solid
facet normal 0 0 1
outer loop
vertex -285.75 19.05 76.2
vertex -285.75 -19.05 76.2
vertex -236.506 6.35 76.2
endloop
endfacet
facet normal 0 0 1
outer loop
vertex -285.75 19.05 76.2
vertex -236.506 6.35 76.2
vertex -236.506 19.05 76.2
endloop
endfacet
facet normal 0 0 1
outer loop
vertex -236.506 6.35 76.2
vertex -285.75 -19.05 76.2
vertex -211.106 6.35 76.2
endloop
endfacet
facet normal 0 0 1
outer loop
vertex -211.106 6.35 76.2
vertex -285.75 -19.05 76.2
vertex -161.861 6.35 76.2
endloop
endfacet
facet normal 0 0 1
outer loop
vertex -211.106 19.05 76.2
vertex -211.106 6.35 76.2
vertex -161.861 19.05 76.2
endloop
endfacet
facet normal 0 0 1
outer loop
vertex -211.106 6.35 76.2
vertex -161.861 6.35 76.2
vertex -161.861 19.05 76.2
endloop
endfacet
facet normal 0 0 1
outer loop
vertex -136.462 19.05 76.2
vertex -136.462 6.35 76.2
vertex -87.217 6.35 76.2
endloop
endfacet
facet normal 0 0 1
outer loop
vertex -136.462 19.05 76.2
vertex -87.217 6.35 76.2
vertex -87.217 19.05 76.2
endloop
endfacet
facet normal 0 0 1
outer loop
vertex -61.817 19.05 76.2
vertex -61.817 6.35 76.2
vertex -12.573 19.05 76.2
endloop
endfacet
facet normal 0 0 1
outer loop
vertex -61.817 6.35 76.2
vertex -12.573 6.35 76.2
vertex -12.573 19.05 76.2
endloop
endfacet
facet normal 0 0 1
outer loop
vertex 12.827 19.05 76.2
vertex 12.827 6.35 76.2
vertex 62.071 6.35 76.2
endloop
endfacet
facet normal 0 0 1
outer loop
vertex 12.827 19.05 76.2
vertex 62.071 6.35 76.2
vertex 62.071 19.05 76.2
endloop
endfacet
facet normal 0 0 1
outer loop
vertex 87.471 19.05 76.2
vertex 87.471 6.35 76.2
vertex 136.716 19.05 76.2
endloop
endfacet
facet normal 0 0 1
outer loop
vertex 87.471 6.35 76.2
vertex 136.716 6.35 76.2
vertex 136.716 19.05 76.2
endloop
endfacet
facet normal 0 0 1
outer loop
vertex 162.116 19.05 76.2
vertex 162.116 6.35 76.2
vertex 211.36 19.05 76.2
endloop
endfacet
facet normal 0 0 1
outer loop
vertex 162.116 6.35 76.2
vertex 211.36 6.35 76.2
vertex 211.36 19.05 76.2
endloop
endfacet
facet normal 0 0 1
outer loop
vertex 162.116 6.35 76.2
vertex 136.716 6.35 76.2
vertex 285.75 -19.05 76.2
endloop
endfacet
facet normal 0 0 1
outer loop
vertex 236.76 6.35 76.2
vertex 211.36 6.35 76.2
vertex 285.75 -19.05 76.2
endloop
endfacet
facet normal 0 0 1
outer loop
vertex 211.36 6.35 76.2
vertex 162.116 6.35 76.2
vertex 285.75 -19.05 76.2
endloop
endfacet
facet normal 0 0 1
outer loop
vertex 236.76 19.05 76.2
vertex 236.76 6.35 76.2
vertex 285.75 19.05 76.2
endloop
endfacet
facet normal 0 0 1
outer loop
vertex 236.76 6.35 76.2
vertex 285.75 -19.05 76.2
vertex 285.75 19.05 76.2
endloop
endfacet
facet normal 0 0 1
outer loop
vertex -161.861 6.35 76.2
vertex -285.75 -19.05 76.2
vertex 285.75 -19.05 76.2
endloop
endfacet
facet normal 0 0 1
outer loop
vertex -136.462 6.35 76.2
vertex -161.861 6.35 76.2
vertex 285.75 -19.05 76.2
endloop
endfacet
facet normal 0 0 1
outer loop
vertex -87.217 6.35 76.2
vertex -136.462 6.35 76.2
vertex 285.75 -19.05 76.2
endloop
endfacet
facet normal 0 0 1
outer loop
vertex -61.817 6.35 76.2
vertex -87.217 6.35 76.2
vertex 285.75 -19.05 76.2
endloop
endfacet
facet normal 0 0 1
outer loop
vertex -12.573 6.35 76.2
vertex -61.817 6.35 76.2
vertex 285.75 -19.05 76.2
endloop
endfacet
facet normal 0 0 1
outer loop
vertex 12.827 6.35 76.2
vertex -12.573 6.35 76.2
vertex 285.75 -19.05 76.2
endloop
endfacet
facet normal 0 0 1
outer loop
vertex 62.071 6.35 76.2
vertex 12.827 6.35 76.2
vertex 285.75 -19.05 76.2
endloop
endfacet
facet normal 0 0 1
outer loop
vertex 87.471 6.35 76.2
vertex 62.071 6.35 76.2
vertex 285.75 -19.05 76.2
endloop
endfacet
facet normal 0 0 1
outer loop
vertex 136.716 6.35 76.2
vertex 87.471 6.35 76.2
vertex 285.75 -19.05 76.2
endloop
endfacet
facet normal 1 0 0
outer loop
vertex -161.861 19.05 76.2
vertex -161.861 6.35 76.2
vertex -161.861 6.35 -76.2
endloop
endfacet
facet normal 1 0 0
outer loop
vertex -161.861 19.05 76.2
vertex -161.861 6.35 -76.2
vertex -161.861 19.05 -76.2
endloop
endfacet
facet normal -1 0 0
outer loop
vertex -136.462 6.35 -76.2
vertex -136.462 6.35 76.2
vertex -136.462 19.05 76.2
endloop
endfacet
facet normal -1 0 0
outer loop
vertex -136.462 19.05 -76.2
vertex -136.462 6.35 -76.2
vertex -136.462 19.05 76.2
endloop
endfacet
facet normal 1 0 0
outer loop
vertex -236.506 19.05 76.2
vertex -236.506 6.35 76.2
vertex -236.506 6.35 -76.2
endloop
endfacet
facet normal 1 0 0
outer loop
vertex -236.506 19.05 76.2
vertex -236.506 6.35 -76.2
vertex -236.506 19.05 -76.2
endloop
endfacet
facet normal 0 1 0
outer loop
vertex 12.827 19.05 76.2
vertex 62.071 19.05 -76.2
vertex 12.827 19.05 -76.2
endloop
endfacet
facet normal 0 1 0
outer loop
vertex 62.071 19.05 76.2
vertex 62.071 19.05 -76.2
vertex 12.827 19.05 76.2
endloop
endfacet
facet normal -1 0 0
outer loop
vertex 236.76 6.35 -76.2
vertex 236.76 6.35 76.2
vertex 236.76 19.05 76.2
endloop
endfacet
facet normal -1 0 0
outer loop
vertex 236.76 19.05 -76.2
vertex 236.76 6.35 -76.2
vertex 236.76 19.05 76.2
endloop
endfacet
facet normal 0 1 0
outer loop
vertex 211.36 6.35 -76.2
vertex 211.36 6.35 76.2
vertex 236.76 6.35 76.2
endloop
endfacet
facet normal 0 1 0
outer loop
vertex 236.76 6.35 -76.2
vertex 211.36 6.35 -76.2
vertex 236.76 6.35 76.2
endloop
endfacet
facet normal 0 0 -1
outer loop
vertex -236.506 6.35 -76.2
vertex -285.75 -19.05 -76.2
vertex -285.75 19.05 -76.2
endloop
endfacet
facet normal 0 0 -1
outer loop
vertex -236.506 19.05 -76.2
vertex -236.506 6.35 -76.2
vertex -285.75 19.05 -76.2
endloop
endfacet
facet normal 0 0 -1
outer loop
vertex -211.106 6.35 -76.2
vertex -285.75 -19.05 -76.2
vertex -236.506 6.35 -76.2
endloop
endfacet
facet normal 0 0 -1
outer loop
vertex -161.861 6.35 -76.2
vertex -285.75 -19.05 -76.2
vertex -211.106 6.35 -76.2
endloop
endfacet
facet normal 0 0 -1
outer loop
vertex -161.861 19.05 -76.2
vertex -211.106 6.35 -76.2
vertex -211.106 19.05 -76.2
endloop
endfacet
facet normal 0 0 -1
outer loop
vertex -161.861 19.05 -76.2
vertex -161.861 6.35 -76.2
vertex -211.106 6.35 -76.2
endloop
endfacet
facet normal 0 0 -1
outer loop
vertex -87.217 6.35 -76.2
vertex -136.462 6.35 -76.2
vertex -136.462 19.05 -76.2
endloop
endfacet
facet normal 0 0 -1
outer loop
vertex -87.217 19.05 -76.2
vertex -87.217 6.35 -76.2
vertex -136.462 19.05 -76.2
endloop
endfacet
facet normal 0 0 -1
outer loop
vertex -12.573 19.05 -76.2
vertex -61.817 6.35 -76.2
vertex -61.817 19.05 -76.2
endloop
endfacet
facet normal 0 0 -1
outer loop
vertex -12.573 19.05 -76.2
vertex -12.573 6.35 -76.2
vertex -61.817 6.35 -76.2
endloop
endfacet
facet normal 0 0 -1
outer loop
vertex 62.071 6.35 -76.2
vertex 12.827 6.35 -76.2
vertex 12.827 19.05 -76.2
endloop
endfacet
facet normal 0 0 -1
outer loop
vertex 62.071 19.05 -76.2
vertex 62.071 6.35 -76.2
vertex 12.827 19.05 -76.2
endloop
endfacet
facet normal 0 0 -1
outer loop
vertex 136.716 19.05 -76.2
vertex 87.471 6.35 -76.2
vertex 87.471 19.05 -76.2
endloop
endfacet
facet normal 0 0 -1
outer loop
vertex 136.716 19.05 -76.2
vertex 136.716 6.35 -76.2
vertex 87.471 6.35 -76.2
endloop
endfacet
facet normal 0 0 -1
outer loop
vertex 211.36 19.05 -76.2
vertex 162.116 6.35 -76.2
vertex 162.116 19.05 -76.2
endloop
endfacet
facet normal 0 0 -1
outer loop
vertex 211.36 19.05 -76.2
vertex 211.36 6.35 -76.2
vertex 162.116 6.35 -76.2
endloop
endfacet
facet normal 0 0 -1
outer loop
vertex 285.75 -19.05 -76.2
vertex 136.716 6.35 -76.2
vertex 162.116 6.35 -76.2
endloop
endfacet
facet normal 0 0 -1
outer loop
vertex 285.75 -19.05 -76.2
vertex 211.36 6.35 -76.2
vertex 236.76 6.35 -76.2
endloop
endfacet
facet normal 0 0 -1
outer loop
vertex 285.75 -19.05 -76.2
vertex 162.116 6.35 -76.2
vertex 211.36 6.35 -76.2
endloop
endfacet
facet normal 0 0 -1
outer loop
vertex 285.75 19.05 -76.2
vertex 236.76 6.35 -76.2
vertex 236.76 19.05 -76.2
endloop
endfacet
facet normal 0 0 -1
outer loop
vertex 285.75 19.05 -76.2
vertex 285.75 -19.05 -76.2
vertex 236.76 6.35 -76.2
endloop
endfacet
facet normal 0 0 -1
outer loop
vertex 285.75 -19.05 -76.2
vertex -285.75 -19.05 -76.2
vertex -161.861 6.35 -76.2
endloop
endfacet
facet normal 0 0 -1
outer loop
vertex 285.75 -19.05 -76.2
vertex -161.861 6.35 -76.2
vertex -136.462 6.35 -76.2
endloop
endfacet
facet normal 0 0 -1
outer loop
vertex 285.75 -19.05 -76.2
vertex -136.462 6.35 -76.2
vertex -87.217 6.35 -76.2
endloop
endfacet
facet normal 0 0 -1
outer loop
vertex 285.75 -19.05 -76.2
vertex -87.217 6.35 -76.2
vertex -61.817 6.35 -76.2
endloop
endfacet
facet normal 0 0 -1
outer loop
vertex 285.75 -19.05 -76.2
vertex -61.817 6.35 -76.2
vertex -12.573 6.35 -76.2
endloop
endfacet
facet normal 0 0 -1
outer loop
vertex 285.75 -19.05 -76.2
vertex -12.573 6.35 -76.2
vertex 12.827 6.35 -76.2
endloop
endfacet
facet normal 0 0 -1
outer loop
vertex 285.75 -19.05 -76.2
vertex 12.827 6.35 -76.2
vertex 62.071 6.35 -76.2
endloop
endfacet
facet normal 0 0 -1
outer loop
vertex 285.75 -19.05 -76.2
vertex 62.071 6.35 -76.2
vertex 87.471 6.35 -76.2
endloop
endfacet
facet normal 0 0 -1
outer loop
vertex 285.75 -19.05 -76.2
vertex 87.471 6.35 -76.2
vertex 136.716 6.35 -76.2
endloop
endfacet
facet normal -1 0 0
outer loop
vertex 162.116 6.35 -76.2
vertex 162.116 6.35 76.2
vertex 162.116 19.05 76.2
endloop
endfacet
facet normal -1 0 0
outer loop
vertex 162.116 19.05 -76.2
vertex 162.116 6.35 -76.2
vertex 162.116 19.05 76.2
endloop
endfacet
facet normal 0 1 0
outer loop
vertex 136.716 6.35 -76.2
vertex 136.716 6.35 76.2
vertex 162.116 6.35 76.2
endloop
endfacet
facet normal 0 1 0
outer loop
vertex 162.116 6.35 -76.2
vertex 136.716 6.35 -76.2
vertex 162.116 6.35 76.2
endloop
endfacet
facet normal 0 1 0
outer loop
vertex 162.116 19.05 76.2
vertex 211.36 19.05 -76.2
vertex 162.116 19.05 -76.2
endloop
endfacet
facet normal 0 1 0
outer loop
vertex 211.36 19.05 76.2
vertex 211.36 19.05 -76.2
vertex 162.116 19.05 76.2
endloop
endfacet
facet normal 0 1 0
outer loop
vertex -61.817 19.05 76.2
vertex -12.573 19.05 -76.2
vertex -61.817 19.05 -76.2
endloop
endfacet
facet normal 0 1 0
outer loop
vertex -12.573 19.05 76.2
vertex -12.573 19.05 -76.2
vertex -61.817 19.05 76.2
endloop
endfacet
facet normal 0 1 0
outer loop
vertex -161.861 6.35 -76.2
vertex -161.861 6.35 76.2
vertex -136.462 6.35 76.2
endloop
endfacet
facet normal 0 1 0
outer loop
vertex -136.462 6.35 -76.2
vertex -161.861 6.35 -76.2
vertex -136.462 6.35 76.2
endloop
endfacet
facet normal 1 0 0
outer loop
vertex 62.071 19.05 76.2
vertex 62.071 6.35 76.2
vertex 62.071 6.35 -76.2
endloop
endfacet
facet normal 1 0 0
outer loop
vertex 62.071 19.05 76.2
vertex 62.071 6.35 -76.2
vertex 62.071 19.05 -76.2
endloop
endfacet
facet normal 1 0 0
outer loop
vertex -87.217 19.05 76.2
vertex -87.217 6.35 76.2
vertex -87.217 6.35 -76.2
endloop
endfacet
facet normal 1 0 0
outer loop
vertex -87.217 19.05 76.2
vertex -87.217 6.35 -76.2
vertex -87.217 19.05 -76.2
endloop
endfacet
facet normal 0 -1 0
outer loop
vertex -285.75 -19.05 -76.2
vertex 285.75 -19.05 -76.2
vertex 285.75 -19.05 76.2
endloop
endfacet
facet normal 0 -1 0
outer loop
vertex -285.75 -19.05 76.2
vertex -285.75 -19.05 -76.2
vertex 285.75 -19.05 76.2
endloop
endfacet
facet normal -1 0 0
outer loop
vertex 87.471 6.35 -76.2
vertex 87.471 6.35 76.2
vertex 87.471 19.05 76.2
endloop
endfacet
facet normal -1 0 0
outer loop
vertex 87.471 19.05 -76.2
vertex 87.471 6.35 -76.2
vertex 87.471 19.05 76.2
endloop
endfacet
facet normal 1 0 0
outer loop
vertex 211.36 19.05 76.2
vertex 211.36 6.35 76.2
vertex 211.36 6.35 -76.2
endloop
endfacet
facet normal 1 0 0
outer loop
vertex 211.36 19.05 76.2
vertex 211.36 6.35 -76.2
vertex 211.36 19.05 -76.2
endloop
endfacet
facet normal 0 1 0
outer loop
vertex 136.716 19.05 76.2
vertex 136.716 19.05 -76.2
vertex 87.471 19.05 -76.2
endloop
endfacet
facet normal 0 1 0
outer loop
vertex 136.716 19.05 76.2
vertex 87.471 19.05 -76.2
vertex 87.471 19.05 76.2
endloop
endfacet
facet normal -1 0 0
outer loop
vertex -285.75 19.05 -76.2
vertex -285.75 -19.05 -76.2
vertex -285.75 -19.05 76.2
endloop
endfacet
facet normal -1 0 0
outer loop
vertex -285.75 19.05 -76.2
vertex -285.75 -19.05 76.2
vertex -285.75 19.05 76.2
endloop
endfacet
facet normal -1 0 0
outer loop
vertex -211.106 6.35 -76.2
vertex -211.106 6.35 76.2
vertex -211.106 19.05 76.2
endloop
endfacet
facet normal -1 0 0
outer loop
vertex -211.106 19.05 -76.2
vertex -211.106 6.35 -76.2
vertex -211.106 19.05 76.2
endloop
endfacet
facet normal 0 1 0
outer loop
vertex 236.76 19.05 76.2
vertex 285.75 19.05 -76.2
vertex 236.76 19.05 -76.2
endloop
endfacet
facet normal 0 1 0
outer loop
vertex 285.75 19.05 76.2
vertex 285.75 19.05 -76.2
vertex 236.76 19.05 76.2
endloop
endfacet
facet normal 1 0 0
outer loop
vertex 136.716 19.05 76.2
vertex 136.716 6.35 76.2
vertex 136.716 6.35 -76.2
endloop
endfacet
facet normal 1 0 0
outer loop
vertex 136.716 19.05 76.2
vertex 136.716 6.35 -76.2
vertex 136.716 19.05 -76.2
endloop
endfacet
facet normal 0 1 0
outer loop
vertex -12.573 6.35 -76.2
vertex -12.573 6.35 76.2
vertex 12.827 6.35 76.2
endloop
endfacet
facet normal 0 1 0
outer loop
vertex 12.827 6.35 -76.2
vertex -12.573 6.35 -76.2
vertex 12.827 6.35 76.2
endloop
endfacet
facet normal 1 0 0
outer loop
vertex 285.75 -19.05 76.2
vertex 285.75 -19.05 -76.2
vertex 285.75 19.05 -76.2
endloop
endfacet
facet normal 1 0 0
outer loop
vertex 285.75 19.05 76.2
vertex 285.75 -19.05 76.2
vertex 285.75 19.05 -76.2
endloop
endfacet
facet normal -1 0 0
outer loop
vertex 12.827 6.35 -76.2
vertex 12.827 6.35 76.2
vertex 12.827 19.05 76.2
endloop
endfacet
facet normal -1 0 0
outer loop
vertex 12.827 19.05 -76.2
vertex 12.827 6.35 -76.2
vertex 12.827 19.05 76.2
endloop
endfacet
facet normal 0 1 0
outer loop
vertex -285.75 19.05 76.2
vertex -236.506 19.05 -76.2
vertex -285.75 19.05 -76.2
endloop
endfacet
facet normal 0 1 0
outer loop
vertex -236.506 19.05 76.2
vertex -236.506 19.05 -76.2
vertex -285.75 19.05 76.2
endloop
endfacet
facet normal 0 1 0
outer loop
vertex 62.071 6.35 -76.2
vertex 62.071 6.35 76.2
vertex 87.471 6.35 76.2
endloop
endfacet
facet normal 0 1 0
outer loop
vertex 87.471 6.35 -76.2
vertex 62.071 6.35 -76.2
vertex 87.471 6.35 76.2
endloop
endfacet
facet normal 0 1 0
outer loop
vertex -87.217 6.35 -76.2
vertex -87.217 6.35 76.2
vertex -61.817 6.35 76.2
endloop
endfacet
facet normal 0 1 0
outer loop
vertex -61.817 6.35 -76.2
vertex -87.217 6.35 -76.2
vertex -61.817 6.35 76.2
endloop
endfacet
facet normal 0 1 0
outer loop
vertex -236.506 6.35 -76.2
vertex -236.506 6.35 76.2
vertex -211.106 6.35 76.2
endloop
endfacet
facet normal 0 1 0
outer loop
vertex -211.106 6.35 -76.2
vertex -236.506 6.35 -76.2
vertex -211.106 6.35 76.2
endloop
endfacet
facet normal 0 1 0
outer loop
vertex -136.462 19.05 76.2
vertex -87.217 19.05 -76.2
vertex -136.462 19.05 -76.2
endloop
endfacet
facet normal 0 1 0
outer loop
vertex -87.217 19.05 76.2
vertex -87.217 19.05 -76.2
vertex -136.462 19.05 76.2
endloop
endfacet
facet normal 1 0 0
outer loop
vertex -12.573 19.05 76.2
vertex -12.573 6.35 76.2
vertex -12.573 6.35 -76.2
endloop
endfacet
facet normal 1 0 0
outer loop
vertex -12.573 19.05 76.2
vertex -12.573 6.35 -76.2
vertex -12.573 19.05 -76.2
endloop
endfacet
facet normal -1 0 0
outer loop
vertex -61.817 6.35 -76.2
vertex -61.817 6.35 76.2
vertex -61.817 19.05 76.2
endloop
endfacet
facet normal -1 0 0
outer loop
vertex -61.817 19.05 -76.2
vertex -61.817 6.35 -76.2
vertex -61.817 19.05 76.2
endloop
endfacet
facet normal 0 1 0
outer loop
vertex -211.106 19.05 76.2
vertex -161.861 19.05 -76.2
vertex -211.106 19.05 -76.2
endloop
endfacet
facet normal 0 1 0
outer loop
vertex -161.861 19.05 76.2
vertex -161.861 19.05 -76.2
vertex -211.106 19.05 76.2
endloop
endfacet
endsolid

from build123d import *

# Parameters (mm, degrees)
F0_W     = 38.1
F0_H     = 152.4
F1_DEPTH = 285.75
F2_W     = 25.4
F2_H     = 12.7
F3_DEPTH = 152.401


with BuildPart() as f1:
    # F0 (on Right) → F1 (new body, symmetric)
    with BuildSketch(Plane.YZ):
        Rectangle(F0_W, F0_H)
    extrude(amount=F1_DEPTH, both=True)

    # F2 (on face) → F3 (cut, through all)
    with BuildSketch(Plane.XY.offset(76.2)):
        with Locations((-223.80575, 12.7)):
            Rectangle(F2_W, F2_H)
        with Locations((-149.1615, 12.7)):
            Rectangle(F2_W, F2_H)
        with Locations((-74.51725, 12.7)):
            Rectangle(F2_W, F2_H)
        with Locations((0.127, 12.7)):
            Rectangle(F2_W, F2_H)
        with Locations((74.77125, 12.7)):
            Rectangle(F2_W, F2_H)
        with Locations((149.4155, 12.7)):
            Rectangle(F2_W, F2_H)
        with Locations((224.05975, 12.7)):
            Rectangle(F2_W, F2_H)
    extrude(amount=-F3_DEPTH, mode=Mode.SUBTRACT)


solid = f1.part
